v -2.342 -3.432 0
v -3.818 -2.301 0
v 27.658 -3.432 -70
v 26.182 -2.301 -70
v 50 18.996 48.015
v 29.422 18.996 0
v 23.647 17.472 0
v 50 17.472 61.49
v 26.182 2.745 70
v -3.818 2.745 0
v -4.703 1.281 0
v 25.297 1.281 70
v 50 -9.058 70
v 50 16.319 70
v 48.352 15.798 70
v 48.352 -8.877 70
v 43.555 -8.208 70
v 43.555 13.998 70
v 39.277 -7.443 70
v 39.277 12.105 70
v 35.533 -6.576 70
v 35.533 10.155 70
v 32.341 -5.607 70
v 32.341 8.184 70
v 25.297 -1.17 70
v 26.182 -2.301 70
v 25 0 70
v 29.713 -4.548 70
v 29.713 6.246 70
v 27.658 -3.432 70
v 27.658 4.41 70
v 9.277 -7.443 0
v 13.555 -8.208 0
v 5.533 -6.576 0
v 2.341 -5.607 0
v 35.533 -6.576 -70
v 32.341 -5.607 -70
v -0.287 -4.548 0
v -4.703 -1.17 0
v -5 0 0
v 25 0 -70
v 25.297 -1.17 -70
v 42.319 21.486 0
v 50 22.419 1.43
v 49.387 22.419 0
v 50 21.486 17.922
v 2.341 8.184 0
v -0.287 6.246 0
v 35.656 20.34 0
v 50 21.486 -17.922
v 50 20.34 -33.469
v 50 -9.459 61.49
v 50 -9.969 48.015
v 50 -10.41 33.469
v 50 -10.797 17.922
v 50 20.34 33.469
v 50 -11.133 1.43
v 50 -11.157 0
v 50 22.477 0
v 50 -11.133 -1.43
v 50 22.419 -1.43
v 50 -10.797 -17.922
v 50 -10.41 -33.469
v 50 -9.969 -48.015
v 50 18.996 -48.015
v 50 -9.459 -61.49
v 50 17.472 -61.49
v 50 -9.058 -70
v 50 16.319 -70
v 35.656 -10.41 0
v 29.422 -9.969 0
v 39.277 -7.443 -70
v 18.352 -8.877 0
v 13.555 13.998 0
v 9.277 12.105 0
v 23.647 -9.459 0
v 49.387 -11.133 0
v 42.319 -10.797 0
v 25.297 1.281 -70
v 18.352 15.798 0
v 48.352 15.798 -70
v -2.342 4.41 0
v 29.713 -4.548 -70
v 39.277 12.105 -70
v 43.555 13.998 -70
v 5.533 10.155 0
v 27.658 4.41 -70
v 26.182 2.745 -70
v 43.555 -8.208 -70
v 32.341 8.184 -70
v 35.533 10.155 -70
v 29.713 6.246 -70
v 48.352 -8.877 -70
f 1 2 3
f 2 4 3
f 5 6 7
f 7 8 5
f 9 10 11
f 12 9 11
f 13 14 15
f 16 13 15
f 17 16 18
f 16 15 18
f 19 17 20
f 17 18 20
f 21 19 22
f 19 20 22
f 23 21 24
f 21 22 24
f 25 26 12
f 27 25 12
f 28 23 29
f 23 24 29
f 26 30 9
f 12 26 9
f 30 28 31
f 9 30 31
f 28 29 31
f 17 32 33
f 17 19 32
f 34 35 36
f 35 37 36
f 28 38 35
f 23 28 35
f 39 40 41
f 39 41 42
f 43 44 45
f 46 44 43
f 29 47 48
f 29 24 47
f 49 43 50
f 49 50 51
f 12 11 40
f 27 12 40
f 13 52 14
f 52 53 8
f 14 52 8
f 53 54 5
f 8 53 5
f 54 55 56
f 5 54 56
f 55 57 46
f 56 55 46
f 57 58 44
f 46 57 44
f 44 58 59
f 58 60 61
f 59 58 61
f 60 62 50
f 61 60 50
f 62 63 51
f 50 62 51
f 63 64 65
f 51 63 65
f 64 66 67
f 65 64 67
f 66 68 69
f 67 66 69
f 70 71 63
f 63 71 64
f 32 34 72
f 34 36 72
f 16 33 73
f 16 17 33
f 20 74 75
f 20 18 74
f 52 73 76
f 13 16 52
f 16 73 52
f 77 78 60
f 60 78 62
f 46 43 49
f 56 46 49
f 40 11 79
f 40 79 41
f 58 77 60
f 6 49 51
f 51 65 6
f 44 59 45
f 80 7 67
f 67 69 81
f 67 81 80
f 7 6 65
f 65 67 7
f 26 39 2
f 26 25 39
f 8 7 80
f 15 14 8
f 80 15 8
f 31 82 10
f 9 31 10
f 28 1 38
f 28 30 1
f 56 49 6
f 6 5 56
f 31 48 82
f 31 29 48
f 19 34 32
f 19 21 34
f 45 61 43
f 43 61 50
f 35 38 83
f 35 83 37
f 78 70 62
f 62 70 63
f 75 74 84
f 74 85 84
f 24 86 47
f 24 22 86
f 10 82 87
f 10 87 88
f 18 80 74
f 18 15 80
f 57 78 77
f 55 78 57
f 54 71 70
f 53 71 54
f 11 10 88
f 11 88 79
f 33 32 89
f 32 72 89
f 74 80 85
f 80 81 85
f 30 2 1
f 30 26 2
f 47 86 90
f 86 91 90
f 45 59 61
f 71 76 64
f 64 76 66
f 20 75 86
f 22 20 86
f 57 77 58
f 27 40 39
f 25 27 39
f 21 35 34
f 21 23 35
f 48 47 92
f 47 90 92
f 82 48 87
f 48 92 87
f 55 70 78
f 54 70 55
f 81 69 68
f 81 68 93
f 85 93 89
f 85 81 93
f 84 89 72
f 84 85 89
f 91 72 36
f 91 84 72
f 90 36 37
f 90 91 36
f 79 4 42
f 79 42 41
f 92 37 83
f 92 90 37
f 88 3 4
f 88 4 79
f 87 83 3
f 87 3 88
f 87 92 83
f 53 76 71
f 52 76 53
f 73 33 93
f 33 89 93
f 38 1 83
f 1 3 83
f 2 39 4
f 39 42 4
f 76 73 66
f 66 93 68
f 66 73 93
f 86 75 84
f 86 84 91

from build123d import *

# Parameters (mm, degrees)
BOX_W     = 300
BOX_H     = 100
BOX_DEPTH = 140


with BuildPart() as cubo:
    # Box → Box (new body)
    with BuildSketch(Plane(origin=(50, -50, -70), x_dir=(1, 0, 0), z_dir=(0, 0, 1))):
        with Locations((150, 50)):
            Rectangle(BOX_W, BOX_H)
    extrude(amount=BOX_DEPTH)


with BuildPart() as loft001:
    # Sketch003 → Loft001 section 0
    with BuildSketch(Plane(origin=(-5, 0, 0), x_dir=(1, 0, 0), z_dir=(0, 0, 1))):
        Polygon((300, 0), (299.703, 0.018), (298.818, 0.072), (297.342, 0.183), (295.287, 0.363), (292.659, 0.621), (289.467, 0.957), (285.723, 1.368), (281.445, 1.851), (276.648, 2.403), (271.353, 3.027), (265.578, 3.732), (259.344, 4.509), (252.681, 5.364), (245.613, 6.288), (238.167, 7.281), (230.373, 8.337), (222.264, 9.45), (213.867, 10.611), (205.218, 11.811), (196.353, 13.038), (187.305, 14.286), (178.107, 15.534), (168.801, 16.767), (159.42, 17.97), (150, 19.119), (140.583, 20.193), (131.199, 21.174), (121.893, 22.038), (112.698, 22.761), (103.647, 23.322), (94.782, 23.703), (86.133, 23.886), (77.736, 23.856), (69.627, 23.607), (61.833, 23.127), (54.387, 22.419), (47.319, 21.486), (40.656, 20.34), (34.422, 18.996), (28.647, 17.472), (23.352, 15.798), (18.555, 13.998), (14.277, 12.105), (10.533, 10.155), (7.341, 8.184), (4.713, 6.246), (2.658, 4.41), (1.182, 2.745), (0.297, 1.281), (0, 0), (0.297, -1.17), (1.182, -2.301), (2.658, -3.432), (4.713, -4.548), (7.341, -5.607), (10.533, -6.576), (14.277, -7.443), (18.555, -8.208), (23.352, -8.877), (28.647, -9.459), (34.422, -9.969), (40.656, -10.41), (47.319, -10.797), (54.387, -11.133), (61.833, -11.427), (69.627, -11.682), (77.736, -11.901), (86.133, -12.084), (94.782, -12.225), (103.647, -12.327), (112.698, -12.381), (121.893, -12.384), (131.199, -12.327), (140.583, -12.207), (150, -12.018), (159.42, -11.757), (168.801, -11.418), (178.107, -11.007), (187.305, -10.524), (196.353, -9.972), (205.218, -9.357), (213.867, -8.691), (222.264, -7.983), (230.373, -7.248), (238.167, -6.492), (245.613, -5.736), (252.681, -4.989), (259.344, -4.269), (265.578, -3.582), (271.353, -2.94), (276.648, -2.355), (281.445, -1.827), (285.723, -1.359), (289.467, -0.954), (292.659, -0.618), (295.287, -0.363), (297.342, -0.183), (298.818, -0.072), (299.703, -0.018), align=None)
    # Sketch004 → Loft001 section 1
    with BuildSketch(Plane(origin=(25, 0, 70), x_dir=(1, 0, 0), z_dir=(0, 0, 1))):
        Polygon((300, 0), (299.703, 0.018), (298.818, 0.072), (297.342, 0.183), (295.287, 0.363), (292.659, 0.621), (289.467, 0.957), (285.723, 1.368), (281.445, 1.851), (276.648, 2.403), (271.353, 3.027), (265.578, 3.732), (259.344, 4.509), (252.681, 5.364), (245.613, 6.288), (238.167, 7.281), (230.373, 8.337), (222.264, 9.45), (213.867, 10.611), (205.218, 11.811), (196.353, 13.038), (187.305, 14.286), (178.107, 15.534), (168.801, 16.767), (159.42, 17.97), (150, 19.119), (140.583, 20.193), (131.199, 21.174), (121.893, 22.038), (112.698, 22.761), (103.647, 23.322), (94.782, 23.703), (86.133, 23.886), (77.736, 23.856), (69.627, 23.607), (61.833, 23.127), (54.387, 22.419), (47.319, 21.486), (40.656, 20.34), (34.422, 18.996), (28.647, 17.472), (23.352, 15.798), (18.555, 13.998), (14.277, 12.105), (10.533, 10.155), (7.341, 8.184), (4.713, 6.246), (2.658, 4.41), (1.182, 2.745), (0.297, 1.281), (0, 0), (0.297, -1.17), (1.182, -2.301), (2.658, -3.432), (4.713, -4.548), (7.341, -5.607), (10.533, -6.576), (14.277, -7.443), (18.555, -8.208), (23.352, -8.877), (28.647, -9.459), (34.422, -9.969), (40.656, -10.41), (47.319, -10.797), (54.387, -11.133), (61.833, -11.427), (69.627, -11.682), (77.736, -11.901), (86.133, -12.084), (94.782, -12.225), (103.647, -12.327), (112.698, -12.381), (121.893, -12.384), (131.199, -12.327), (140.583, -12.207), (150, -12.018), (159.42, -11.757), (168.801, -11.418), (178.107, -11.007), (187.305, -10.524), (196.353, -9.972), (205.218, -9.357), (213.867, -8.691), (222.264, -7.983), (230.373, -7.248), (238.167, -6.492), (245.613, -5.736), (252.681, -4.989), (259.344, -4.269), (265.578, -3.582), (271.353, -2.94), (276.648, -2.355), (281.445, -1.827), (285.723, -1.359), (289.467, -0.954), (292.659, -0.618), (295.287, -0.363), (297.342, -0.183), (298.818, -0.072), (299.703, -0.018), align=None)
    loft()


with BuildPart() as cut:
    # Part__Mirroring001: instance of Loft001
    add(loft001.part.mirror(Plane(origin=(0, 0, 0), x_dir=(0, 1, 0), z_dir=(0, 0, 1))))

    # Fusion: union Loft001
    add(loft001.part)

    # Cut: cut Cubo
    add(cubo.part, mode=Mode.SUBTRACT)


solid = cut.part
